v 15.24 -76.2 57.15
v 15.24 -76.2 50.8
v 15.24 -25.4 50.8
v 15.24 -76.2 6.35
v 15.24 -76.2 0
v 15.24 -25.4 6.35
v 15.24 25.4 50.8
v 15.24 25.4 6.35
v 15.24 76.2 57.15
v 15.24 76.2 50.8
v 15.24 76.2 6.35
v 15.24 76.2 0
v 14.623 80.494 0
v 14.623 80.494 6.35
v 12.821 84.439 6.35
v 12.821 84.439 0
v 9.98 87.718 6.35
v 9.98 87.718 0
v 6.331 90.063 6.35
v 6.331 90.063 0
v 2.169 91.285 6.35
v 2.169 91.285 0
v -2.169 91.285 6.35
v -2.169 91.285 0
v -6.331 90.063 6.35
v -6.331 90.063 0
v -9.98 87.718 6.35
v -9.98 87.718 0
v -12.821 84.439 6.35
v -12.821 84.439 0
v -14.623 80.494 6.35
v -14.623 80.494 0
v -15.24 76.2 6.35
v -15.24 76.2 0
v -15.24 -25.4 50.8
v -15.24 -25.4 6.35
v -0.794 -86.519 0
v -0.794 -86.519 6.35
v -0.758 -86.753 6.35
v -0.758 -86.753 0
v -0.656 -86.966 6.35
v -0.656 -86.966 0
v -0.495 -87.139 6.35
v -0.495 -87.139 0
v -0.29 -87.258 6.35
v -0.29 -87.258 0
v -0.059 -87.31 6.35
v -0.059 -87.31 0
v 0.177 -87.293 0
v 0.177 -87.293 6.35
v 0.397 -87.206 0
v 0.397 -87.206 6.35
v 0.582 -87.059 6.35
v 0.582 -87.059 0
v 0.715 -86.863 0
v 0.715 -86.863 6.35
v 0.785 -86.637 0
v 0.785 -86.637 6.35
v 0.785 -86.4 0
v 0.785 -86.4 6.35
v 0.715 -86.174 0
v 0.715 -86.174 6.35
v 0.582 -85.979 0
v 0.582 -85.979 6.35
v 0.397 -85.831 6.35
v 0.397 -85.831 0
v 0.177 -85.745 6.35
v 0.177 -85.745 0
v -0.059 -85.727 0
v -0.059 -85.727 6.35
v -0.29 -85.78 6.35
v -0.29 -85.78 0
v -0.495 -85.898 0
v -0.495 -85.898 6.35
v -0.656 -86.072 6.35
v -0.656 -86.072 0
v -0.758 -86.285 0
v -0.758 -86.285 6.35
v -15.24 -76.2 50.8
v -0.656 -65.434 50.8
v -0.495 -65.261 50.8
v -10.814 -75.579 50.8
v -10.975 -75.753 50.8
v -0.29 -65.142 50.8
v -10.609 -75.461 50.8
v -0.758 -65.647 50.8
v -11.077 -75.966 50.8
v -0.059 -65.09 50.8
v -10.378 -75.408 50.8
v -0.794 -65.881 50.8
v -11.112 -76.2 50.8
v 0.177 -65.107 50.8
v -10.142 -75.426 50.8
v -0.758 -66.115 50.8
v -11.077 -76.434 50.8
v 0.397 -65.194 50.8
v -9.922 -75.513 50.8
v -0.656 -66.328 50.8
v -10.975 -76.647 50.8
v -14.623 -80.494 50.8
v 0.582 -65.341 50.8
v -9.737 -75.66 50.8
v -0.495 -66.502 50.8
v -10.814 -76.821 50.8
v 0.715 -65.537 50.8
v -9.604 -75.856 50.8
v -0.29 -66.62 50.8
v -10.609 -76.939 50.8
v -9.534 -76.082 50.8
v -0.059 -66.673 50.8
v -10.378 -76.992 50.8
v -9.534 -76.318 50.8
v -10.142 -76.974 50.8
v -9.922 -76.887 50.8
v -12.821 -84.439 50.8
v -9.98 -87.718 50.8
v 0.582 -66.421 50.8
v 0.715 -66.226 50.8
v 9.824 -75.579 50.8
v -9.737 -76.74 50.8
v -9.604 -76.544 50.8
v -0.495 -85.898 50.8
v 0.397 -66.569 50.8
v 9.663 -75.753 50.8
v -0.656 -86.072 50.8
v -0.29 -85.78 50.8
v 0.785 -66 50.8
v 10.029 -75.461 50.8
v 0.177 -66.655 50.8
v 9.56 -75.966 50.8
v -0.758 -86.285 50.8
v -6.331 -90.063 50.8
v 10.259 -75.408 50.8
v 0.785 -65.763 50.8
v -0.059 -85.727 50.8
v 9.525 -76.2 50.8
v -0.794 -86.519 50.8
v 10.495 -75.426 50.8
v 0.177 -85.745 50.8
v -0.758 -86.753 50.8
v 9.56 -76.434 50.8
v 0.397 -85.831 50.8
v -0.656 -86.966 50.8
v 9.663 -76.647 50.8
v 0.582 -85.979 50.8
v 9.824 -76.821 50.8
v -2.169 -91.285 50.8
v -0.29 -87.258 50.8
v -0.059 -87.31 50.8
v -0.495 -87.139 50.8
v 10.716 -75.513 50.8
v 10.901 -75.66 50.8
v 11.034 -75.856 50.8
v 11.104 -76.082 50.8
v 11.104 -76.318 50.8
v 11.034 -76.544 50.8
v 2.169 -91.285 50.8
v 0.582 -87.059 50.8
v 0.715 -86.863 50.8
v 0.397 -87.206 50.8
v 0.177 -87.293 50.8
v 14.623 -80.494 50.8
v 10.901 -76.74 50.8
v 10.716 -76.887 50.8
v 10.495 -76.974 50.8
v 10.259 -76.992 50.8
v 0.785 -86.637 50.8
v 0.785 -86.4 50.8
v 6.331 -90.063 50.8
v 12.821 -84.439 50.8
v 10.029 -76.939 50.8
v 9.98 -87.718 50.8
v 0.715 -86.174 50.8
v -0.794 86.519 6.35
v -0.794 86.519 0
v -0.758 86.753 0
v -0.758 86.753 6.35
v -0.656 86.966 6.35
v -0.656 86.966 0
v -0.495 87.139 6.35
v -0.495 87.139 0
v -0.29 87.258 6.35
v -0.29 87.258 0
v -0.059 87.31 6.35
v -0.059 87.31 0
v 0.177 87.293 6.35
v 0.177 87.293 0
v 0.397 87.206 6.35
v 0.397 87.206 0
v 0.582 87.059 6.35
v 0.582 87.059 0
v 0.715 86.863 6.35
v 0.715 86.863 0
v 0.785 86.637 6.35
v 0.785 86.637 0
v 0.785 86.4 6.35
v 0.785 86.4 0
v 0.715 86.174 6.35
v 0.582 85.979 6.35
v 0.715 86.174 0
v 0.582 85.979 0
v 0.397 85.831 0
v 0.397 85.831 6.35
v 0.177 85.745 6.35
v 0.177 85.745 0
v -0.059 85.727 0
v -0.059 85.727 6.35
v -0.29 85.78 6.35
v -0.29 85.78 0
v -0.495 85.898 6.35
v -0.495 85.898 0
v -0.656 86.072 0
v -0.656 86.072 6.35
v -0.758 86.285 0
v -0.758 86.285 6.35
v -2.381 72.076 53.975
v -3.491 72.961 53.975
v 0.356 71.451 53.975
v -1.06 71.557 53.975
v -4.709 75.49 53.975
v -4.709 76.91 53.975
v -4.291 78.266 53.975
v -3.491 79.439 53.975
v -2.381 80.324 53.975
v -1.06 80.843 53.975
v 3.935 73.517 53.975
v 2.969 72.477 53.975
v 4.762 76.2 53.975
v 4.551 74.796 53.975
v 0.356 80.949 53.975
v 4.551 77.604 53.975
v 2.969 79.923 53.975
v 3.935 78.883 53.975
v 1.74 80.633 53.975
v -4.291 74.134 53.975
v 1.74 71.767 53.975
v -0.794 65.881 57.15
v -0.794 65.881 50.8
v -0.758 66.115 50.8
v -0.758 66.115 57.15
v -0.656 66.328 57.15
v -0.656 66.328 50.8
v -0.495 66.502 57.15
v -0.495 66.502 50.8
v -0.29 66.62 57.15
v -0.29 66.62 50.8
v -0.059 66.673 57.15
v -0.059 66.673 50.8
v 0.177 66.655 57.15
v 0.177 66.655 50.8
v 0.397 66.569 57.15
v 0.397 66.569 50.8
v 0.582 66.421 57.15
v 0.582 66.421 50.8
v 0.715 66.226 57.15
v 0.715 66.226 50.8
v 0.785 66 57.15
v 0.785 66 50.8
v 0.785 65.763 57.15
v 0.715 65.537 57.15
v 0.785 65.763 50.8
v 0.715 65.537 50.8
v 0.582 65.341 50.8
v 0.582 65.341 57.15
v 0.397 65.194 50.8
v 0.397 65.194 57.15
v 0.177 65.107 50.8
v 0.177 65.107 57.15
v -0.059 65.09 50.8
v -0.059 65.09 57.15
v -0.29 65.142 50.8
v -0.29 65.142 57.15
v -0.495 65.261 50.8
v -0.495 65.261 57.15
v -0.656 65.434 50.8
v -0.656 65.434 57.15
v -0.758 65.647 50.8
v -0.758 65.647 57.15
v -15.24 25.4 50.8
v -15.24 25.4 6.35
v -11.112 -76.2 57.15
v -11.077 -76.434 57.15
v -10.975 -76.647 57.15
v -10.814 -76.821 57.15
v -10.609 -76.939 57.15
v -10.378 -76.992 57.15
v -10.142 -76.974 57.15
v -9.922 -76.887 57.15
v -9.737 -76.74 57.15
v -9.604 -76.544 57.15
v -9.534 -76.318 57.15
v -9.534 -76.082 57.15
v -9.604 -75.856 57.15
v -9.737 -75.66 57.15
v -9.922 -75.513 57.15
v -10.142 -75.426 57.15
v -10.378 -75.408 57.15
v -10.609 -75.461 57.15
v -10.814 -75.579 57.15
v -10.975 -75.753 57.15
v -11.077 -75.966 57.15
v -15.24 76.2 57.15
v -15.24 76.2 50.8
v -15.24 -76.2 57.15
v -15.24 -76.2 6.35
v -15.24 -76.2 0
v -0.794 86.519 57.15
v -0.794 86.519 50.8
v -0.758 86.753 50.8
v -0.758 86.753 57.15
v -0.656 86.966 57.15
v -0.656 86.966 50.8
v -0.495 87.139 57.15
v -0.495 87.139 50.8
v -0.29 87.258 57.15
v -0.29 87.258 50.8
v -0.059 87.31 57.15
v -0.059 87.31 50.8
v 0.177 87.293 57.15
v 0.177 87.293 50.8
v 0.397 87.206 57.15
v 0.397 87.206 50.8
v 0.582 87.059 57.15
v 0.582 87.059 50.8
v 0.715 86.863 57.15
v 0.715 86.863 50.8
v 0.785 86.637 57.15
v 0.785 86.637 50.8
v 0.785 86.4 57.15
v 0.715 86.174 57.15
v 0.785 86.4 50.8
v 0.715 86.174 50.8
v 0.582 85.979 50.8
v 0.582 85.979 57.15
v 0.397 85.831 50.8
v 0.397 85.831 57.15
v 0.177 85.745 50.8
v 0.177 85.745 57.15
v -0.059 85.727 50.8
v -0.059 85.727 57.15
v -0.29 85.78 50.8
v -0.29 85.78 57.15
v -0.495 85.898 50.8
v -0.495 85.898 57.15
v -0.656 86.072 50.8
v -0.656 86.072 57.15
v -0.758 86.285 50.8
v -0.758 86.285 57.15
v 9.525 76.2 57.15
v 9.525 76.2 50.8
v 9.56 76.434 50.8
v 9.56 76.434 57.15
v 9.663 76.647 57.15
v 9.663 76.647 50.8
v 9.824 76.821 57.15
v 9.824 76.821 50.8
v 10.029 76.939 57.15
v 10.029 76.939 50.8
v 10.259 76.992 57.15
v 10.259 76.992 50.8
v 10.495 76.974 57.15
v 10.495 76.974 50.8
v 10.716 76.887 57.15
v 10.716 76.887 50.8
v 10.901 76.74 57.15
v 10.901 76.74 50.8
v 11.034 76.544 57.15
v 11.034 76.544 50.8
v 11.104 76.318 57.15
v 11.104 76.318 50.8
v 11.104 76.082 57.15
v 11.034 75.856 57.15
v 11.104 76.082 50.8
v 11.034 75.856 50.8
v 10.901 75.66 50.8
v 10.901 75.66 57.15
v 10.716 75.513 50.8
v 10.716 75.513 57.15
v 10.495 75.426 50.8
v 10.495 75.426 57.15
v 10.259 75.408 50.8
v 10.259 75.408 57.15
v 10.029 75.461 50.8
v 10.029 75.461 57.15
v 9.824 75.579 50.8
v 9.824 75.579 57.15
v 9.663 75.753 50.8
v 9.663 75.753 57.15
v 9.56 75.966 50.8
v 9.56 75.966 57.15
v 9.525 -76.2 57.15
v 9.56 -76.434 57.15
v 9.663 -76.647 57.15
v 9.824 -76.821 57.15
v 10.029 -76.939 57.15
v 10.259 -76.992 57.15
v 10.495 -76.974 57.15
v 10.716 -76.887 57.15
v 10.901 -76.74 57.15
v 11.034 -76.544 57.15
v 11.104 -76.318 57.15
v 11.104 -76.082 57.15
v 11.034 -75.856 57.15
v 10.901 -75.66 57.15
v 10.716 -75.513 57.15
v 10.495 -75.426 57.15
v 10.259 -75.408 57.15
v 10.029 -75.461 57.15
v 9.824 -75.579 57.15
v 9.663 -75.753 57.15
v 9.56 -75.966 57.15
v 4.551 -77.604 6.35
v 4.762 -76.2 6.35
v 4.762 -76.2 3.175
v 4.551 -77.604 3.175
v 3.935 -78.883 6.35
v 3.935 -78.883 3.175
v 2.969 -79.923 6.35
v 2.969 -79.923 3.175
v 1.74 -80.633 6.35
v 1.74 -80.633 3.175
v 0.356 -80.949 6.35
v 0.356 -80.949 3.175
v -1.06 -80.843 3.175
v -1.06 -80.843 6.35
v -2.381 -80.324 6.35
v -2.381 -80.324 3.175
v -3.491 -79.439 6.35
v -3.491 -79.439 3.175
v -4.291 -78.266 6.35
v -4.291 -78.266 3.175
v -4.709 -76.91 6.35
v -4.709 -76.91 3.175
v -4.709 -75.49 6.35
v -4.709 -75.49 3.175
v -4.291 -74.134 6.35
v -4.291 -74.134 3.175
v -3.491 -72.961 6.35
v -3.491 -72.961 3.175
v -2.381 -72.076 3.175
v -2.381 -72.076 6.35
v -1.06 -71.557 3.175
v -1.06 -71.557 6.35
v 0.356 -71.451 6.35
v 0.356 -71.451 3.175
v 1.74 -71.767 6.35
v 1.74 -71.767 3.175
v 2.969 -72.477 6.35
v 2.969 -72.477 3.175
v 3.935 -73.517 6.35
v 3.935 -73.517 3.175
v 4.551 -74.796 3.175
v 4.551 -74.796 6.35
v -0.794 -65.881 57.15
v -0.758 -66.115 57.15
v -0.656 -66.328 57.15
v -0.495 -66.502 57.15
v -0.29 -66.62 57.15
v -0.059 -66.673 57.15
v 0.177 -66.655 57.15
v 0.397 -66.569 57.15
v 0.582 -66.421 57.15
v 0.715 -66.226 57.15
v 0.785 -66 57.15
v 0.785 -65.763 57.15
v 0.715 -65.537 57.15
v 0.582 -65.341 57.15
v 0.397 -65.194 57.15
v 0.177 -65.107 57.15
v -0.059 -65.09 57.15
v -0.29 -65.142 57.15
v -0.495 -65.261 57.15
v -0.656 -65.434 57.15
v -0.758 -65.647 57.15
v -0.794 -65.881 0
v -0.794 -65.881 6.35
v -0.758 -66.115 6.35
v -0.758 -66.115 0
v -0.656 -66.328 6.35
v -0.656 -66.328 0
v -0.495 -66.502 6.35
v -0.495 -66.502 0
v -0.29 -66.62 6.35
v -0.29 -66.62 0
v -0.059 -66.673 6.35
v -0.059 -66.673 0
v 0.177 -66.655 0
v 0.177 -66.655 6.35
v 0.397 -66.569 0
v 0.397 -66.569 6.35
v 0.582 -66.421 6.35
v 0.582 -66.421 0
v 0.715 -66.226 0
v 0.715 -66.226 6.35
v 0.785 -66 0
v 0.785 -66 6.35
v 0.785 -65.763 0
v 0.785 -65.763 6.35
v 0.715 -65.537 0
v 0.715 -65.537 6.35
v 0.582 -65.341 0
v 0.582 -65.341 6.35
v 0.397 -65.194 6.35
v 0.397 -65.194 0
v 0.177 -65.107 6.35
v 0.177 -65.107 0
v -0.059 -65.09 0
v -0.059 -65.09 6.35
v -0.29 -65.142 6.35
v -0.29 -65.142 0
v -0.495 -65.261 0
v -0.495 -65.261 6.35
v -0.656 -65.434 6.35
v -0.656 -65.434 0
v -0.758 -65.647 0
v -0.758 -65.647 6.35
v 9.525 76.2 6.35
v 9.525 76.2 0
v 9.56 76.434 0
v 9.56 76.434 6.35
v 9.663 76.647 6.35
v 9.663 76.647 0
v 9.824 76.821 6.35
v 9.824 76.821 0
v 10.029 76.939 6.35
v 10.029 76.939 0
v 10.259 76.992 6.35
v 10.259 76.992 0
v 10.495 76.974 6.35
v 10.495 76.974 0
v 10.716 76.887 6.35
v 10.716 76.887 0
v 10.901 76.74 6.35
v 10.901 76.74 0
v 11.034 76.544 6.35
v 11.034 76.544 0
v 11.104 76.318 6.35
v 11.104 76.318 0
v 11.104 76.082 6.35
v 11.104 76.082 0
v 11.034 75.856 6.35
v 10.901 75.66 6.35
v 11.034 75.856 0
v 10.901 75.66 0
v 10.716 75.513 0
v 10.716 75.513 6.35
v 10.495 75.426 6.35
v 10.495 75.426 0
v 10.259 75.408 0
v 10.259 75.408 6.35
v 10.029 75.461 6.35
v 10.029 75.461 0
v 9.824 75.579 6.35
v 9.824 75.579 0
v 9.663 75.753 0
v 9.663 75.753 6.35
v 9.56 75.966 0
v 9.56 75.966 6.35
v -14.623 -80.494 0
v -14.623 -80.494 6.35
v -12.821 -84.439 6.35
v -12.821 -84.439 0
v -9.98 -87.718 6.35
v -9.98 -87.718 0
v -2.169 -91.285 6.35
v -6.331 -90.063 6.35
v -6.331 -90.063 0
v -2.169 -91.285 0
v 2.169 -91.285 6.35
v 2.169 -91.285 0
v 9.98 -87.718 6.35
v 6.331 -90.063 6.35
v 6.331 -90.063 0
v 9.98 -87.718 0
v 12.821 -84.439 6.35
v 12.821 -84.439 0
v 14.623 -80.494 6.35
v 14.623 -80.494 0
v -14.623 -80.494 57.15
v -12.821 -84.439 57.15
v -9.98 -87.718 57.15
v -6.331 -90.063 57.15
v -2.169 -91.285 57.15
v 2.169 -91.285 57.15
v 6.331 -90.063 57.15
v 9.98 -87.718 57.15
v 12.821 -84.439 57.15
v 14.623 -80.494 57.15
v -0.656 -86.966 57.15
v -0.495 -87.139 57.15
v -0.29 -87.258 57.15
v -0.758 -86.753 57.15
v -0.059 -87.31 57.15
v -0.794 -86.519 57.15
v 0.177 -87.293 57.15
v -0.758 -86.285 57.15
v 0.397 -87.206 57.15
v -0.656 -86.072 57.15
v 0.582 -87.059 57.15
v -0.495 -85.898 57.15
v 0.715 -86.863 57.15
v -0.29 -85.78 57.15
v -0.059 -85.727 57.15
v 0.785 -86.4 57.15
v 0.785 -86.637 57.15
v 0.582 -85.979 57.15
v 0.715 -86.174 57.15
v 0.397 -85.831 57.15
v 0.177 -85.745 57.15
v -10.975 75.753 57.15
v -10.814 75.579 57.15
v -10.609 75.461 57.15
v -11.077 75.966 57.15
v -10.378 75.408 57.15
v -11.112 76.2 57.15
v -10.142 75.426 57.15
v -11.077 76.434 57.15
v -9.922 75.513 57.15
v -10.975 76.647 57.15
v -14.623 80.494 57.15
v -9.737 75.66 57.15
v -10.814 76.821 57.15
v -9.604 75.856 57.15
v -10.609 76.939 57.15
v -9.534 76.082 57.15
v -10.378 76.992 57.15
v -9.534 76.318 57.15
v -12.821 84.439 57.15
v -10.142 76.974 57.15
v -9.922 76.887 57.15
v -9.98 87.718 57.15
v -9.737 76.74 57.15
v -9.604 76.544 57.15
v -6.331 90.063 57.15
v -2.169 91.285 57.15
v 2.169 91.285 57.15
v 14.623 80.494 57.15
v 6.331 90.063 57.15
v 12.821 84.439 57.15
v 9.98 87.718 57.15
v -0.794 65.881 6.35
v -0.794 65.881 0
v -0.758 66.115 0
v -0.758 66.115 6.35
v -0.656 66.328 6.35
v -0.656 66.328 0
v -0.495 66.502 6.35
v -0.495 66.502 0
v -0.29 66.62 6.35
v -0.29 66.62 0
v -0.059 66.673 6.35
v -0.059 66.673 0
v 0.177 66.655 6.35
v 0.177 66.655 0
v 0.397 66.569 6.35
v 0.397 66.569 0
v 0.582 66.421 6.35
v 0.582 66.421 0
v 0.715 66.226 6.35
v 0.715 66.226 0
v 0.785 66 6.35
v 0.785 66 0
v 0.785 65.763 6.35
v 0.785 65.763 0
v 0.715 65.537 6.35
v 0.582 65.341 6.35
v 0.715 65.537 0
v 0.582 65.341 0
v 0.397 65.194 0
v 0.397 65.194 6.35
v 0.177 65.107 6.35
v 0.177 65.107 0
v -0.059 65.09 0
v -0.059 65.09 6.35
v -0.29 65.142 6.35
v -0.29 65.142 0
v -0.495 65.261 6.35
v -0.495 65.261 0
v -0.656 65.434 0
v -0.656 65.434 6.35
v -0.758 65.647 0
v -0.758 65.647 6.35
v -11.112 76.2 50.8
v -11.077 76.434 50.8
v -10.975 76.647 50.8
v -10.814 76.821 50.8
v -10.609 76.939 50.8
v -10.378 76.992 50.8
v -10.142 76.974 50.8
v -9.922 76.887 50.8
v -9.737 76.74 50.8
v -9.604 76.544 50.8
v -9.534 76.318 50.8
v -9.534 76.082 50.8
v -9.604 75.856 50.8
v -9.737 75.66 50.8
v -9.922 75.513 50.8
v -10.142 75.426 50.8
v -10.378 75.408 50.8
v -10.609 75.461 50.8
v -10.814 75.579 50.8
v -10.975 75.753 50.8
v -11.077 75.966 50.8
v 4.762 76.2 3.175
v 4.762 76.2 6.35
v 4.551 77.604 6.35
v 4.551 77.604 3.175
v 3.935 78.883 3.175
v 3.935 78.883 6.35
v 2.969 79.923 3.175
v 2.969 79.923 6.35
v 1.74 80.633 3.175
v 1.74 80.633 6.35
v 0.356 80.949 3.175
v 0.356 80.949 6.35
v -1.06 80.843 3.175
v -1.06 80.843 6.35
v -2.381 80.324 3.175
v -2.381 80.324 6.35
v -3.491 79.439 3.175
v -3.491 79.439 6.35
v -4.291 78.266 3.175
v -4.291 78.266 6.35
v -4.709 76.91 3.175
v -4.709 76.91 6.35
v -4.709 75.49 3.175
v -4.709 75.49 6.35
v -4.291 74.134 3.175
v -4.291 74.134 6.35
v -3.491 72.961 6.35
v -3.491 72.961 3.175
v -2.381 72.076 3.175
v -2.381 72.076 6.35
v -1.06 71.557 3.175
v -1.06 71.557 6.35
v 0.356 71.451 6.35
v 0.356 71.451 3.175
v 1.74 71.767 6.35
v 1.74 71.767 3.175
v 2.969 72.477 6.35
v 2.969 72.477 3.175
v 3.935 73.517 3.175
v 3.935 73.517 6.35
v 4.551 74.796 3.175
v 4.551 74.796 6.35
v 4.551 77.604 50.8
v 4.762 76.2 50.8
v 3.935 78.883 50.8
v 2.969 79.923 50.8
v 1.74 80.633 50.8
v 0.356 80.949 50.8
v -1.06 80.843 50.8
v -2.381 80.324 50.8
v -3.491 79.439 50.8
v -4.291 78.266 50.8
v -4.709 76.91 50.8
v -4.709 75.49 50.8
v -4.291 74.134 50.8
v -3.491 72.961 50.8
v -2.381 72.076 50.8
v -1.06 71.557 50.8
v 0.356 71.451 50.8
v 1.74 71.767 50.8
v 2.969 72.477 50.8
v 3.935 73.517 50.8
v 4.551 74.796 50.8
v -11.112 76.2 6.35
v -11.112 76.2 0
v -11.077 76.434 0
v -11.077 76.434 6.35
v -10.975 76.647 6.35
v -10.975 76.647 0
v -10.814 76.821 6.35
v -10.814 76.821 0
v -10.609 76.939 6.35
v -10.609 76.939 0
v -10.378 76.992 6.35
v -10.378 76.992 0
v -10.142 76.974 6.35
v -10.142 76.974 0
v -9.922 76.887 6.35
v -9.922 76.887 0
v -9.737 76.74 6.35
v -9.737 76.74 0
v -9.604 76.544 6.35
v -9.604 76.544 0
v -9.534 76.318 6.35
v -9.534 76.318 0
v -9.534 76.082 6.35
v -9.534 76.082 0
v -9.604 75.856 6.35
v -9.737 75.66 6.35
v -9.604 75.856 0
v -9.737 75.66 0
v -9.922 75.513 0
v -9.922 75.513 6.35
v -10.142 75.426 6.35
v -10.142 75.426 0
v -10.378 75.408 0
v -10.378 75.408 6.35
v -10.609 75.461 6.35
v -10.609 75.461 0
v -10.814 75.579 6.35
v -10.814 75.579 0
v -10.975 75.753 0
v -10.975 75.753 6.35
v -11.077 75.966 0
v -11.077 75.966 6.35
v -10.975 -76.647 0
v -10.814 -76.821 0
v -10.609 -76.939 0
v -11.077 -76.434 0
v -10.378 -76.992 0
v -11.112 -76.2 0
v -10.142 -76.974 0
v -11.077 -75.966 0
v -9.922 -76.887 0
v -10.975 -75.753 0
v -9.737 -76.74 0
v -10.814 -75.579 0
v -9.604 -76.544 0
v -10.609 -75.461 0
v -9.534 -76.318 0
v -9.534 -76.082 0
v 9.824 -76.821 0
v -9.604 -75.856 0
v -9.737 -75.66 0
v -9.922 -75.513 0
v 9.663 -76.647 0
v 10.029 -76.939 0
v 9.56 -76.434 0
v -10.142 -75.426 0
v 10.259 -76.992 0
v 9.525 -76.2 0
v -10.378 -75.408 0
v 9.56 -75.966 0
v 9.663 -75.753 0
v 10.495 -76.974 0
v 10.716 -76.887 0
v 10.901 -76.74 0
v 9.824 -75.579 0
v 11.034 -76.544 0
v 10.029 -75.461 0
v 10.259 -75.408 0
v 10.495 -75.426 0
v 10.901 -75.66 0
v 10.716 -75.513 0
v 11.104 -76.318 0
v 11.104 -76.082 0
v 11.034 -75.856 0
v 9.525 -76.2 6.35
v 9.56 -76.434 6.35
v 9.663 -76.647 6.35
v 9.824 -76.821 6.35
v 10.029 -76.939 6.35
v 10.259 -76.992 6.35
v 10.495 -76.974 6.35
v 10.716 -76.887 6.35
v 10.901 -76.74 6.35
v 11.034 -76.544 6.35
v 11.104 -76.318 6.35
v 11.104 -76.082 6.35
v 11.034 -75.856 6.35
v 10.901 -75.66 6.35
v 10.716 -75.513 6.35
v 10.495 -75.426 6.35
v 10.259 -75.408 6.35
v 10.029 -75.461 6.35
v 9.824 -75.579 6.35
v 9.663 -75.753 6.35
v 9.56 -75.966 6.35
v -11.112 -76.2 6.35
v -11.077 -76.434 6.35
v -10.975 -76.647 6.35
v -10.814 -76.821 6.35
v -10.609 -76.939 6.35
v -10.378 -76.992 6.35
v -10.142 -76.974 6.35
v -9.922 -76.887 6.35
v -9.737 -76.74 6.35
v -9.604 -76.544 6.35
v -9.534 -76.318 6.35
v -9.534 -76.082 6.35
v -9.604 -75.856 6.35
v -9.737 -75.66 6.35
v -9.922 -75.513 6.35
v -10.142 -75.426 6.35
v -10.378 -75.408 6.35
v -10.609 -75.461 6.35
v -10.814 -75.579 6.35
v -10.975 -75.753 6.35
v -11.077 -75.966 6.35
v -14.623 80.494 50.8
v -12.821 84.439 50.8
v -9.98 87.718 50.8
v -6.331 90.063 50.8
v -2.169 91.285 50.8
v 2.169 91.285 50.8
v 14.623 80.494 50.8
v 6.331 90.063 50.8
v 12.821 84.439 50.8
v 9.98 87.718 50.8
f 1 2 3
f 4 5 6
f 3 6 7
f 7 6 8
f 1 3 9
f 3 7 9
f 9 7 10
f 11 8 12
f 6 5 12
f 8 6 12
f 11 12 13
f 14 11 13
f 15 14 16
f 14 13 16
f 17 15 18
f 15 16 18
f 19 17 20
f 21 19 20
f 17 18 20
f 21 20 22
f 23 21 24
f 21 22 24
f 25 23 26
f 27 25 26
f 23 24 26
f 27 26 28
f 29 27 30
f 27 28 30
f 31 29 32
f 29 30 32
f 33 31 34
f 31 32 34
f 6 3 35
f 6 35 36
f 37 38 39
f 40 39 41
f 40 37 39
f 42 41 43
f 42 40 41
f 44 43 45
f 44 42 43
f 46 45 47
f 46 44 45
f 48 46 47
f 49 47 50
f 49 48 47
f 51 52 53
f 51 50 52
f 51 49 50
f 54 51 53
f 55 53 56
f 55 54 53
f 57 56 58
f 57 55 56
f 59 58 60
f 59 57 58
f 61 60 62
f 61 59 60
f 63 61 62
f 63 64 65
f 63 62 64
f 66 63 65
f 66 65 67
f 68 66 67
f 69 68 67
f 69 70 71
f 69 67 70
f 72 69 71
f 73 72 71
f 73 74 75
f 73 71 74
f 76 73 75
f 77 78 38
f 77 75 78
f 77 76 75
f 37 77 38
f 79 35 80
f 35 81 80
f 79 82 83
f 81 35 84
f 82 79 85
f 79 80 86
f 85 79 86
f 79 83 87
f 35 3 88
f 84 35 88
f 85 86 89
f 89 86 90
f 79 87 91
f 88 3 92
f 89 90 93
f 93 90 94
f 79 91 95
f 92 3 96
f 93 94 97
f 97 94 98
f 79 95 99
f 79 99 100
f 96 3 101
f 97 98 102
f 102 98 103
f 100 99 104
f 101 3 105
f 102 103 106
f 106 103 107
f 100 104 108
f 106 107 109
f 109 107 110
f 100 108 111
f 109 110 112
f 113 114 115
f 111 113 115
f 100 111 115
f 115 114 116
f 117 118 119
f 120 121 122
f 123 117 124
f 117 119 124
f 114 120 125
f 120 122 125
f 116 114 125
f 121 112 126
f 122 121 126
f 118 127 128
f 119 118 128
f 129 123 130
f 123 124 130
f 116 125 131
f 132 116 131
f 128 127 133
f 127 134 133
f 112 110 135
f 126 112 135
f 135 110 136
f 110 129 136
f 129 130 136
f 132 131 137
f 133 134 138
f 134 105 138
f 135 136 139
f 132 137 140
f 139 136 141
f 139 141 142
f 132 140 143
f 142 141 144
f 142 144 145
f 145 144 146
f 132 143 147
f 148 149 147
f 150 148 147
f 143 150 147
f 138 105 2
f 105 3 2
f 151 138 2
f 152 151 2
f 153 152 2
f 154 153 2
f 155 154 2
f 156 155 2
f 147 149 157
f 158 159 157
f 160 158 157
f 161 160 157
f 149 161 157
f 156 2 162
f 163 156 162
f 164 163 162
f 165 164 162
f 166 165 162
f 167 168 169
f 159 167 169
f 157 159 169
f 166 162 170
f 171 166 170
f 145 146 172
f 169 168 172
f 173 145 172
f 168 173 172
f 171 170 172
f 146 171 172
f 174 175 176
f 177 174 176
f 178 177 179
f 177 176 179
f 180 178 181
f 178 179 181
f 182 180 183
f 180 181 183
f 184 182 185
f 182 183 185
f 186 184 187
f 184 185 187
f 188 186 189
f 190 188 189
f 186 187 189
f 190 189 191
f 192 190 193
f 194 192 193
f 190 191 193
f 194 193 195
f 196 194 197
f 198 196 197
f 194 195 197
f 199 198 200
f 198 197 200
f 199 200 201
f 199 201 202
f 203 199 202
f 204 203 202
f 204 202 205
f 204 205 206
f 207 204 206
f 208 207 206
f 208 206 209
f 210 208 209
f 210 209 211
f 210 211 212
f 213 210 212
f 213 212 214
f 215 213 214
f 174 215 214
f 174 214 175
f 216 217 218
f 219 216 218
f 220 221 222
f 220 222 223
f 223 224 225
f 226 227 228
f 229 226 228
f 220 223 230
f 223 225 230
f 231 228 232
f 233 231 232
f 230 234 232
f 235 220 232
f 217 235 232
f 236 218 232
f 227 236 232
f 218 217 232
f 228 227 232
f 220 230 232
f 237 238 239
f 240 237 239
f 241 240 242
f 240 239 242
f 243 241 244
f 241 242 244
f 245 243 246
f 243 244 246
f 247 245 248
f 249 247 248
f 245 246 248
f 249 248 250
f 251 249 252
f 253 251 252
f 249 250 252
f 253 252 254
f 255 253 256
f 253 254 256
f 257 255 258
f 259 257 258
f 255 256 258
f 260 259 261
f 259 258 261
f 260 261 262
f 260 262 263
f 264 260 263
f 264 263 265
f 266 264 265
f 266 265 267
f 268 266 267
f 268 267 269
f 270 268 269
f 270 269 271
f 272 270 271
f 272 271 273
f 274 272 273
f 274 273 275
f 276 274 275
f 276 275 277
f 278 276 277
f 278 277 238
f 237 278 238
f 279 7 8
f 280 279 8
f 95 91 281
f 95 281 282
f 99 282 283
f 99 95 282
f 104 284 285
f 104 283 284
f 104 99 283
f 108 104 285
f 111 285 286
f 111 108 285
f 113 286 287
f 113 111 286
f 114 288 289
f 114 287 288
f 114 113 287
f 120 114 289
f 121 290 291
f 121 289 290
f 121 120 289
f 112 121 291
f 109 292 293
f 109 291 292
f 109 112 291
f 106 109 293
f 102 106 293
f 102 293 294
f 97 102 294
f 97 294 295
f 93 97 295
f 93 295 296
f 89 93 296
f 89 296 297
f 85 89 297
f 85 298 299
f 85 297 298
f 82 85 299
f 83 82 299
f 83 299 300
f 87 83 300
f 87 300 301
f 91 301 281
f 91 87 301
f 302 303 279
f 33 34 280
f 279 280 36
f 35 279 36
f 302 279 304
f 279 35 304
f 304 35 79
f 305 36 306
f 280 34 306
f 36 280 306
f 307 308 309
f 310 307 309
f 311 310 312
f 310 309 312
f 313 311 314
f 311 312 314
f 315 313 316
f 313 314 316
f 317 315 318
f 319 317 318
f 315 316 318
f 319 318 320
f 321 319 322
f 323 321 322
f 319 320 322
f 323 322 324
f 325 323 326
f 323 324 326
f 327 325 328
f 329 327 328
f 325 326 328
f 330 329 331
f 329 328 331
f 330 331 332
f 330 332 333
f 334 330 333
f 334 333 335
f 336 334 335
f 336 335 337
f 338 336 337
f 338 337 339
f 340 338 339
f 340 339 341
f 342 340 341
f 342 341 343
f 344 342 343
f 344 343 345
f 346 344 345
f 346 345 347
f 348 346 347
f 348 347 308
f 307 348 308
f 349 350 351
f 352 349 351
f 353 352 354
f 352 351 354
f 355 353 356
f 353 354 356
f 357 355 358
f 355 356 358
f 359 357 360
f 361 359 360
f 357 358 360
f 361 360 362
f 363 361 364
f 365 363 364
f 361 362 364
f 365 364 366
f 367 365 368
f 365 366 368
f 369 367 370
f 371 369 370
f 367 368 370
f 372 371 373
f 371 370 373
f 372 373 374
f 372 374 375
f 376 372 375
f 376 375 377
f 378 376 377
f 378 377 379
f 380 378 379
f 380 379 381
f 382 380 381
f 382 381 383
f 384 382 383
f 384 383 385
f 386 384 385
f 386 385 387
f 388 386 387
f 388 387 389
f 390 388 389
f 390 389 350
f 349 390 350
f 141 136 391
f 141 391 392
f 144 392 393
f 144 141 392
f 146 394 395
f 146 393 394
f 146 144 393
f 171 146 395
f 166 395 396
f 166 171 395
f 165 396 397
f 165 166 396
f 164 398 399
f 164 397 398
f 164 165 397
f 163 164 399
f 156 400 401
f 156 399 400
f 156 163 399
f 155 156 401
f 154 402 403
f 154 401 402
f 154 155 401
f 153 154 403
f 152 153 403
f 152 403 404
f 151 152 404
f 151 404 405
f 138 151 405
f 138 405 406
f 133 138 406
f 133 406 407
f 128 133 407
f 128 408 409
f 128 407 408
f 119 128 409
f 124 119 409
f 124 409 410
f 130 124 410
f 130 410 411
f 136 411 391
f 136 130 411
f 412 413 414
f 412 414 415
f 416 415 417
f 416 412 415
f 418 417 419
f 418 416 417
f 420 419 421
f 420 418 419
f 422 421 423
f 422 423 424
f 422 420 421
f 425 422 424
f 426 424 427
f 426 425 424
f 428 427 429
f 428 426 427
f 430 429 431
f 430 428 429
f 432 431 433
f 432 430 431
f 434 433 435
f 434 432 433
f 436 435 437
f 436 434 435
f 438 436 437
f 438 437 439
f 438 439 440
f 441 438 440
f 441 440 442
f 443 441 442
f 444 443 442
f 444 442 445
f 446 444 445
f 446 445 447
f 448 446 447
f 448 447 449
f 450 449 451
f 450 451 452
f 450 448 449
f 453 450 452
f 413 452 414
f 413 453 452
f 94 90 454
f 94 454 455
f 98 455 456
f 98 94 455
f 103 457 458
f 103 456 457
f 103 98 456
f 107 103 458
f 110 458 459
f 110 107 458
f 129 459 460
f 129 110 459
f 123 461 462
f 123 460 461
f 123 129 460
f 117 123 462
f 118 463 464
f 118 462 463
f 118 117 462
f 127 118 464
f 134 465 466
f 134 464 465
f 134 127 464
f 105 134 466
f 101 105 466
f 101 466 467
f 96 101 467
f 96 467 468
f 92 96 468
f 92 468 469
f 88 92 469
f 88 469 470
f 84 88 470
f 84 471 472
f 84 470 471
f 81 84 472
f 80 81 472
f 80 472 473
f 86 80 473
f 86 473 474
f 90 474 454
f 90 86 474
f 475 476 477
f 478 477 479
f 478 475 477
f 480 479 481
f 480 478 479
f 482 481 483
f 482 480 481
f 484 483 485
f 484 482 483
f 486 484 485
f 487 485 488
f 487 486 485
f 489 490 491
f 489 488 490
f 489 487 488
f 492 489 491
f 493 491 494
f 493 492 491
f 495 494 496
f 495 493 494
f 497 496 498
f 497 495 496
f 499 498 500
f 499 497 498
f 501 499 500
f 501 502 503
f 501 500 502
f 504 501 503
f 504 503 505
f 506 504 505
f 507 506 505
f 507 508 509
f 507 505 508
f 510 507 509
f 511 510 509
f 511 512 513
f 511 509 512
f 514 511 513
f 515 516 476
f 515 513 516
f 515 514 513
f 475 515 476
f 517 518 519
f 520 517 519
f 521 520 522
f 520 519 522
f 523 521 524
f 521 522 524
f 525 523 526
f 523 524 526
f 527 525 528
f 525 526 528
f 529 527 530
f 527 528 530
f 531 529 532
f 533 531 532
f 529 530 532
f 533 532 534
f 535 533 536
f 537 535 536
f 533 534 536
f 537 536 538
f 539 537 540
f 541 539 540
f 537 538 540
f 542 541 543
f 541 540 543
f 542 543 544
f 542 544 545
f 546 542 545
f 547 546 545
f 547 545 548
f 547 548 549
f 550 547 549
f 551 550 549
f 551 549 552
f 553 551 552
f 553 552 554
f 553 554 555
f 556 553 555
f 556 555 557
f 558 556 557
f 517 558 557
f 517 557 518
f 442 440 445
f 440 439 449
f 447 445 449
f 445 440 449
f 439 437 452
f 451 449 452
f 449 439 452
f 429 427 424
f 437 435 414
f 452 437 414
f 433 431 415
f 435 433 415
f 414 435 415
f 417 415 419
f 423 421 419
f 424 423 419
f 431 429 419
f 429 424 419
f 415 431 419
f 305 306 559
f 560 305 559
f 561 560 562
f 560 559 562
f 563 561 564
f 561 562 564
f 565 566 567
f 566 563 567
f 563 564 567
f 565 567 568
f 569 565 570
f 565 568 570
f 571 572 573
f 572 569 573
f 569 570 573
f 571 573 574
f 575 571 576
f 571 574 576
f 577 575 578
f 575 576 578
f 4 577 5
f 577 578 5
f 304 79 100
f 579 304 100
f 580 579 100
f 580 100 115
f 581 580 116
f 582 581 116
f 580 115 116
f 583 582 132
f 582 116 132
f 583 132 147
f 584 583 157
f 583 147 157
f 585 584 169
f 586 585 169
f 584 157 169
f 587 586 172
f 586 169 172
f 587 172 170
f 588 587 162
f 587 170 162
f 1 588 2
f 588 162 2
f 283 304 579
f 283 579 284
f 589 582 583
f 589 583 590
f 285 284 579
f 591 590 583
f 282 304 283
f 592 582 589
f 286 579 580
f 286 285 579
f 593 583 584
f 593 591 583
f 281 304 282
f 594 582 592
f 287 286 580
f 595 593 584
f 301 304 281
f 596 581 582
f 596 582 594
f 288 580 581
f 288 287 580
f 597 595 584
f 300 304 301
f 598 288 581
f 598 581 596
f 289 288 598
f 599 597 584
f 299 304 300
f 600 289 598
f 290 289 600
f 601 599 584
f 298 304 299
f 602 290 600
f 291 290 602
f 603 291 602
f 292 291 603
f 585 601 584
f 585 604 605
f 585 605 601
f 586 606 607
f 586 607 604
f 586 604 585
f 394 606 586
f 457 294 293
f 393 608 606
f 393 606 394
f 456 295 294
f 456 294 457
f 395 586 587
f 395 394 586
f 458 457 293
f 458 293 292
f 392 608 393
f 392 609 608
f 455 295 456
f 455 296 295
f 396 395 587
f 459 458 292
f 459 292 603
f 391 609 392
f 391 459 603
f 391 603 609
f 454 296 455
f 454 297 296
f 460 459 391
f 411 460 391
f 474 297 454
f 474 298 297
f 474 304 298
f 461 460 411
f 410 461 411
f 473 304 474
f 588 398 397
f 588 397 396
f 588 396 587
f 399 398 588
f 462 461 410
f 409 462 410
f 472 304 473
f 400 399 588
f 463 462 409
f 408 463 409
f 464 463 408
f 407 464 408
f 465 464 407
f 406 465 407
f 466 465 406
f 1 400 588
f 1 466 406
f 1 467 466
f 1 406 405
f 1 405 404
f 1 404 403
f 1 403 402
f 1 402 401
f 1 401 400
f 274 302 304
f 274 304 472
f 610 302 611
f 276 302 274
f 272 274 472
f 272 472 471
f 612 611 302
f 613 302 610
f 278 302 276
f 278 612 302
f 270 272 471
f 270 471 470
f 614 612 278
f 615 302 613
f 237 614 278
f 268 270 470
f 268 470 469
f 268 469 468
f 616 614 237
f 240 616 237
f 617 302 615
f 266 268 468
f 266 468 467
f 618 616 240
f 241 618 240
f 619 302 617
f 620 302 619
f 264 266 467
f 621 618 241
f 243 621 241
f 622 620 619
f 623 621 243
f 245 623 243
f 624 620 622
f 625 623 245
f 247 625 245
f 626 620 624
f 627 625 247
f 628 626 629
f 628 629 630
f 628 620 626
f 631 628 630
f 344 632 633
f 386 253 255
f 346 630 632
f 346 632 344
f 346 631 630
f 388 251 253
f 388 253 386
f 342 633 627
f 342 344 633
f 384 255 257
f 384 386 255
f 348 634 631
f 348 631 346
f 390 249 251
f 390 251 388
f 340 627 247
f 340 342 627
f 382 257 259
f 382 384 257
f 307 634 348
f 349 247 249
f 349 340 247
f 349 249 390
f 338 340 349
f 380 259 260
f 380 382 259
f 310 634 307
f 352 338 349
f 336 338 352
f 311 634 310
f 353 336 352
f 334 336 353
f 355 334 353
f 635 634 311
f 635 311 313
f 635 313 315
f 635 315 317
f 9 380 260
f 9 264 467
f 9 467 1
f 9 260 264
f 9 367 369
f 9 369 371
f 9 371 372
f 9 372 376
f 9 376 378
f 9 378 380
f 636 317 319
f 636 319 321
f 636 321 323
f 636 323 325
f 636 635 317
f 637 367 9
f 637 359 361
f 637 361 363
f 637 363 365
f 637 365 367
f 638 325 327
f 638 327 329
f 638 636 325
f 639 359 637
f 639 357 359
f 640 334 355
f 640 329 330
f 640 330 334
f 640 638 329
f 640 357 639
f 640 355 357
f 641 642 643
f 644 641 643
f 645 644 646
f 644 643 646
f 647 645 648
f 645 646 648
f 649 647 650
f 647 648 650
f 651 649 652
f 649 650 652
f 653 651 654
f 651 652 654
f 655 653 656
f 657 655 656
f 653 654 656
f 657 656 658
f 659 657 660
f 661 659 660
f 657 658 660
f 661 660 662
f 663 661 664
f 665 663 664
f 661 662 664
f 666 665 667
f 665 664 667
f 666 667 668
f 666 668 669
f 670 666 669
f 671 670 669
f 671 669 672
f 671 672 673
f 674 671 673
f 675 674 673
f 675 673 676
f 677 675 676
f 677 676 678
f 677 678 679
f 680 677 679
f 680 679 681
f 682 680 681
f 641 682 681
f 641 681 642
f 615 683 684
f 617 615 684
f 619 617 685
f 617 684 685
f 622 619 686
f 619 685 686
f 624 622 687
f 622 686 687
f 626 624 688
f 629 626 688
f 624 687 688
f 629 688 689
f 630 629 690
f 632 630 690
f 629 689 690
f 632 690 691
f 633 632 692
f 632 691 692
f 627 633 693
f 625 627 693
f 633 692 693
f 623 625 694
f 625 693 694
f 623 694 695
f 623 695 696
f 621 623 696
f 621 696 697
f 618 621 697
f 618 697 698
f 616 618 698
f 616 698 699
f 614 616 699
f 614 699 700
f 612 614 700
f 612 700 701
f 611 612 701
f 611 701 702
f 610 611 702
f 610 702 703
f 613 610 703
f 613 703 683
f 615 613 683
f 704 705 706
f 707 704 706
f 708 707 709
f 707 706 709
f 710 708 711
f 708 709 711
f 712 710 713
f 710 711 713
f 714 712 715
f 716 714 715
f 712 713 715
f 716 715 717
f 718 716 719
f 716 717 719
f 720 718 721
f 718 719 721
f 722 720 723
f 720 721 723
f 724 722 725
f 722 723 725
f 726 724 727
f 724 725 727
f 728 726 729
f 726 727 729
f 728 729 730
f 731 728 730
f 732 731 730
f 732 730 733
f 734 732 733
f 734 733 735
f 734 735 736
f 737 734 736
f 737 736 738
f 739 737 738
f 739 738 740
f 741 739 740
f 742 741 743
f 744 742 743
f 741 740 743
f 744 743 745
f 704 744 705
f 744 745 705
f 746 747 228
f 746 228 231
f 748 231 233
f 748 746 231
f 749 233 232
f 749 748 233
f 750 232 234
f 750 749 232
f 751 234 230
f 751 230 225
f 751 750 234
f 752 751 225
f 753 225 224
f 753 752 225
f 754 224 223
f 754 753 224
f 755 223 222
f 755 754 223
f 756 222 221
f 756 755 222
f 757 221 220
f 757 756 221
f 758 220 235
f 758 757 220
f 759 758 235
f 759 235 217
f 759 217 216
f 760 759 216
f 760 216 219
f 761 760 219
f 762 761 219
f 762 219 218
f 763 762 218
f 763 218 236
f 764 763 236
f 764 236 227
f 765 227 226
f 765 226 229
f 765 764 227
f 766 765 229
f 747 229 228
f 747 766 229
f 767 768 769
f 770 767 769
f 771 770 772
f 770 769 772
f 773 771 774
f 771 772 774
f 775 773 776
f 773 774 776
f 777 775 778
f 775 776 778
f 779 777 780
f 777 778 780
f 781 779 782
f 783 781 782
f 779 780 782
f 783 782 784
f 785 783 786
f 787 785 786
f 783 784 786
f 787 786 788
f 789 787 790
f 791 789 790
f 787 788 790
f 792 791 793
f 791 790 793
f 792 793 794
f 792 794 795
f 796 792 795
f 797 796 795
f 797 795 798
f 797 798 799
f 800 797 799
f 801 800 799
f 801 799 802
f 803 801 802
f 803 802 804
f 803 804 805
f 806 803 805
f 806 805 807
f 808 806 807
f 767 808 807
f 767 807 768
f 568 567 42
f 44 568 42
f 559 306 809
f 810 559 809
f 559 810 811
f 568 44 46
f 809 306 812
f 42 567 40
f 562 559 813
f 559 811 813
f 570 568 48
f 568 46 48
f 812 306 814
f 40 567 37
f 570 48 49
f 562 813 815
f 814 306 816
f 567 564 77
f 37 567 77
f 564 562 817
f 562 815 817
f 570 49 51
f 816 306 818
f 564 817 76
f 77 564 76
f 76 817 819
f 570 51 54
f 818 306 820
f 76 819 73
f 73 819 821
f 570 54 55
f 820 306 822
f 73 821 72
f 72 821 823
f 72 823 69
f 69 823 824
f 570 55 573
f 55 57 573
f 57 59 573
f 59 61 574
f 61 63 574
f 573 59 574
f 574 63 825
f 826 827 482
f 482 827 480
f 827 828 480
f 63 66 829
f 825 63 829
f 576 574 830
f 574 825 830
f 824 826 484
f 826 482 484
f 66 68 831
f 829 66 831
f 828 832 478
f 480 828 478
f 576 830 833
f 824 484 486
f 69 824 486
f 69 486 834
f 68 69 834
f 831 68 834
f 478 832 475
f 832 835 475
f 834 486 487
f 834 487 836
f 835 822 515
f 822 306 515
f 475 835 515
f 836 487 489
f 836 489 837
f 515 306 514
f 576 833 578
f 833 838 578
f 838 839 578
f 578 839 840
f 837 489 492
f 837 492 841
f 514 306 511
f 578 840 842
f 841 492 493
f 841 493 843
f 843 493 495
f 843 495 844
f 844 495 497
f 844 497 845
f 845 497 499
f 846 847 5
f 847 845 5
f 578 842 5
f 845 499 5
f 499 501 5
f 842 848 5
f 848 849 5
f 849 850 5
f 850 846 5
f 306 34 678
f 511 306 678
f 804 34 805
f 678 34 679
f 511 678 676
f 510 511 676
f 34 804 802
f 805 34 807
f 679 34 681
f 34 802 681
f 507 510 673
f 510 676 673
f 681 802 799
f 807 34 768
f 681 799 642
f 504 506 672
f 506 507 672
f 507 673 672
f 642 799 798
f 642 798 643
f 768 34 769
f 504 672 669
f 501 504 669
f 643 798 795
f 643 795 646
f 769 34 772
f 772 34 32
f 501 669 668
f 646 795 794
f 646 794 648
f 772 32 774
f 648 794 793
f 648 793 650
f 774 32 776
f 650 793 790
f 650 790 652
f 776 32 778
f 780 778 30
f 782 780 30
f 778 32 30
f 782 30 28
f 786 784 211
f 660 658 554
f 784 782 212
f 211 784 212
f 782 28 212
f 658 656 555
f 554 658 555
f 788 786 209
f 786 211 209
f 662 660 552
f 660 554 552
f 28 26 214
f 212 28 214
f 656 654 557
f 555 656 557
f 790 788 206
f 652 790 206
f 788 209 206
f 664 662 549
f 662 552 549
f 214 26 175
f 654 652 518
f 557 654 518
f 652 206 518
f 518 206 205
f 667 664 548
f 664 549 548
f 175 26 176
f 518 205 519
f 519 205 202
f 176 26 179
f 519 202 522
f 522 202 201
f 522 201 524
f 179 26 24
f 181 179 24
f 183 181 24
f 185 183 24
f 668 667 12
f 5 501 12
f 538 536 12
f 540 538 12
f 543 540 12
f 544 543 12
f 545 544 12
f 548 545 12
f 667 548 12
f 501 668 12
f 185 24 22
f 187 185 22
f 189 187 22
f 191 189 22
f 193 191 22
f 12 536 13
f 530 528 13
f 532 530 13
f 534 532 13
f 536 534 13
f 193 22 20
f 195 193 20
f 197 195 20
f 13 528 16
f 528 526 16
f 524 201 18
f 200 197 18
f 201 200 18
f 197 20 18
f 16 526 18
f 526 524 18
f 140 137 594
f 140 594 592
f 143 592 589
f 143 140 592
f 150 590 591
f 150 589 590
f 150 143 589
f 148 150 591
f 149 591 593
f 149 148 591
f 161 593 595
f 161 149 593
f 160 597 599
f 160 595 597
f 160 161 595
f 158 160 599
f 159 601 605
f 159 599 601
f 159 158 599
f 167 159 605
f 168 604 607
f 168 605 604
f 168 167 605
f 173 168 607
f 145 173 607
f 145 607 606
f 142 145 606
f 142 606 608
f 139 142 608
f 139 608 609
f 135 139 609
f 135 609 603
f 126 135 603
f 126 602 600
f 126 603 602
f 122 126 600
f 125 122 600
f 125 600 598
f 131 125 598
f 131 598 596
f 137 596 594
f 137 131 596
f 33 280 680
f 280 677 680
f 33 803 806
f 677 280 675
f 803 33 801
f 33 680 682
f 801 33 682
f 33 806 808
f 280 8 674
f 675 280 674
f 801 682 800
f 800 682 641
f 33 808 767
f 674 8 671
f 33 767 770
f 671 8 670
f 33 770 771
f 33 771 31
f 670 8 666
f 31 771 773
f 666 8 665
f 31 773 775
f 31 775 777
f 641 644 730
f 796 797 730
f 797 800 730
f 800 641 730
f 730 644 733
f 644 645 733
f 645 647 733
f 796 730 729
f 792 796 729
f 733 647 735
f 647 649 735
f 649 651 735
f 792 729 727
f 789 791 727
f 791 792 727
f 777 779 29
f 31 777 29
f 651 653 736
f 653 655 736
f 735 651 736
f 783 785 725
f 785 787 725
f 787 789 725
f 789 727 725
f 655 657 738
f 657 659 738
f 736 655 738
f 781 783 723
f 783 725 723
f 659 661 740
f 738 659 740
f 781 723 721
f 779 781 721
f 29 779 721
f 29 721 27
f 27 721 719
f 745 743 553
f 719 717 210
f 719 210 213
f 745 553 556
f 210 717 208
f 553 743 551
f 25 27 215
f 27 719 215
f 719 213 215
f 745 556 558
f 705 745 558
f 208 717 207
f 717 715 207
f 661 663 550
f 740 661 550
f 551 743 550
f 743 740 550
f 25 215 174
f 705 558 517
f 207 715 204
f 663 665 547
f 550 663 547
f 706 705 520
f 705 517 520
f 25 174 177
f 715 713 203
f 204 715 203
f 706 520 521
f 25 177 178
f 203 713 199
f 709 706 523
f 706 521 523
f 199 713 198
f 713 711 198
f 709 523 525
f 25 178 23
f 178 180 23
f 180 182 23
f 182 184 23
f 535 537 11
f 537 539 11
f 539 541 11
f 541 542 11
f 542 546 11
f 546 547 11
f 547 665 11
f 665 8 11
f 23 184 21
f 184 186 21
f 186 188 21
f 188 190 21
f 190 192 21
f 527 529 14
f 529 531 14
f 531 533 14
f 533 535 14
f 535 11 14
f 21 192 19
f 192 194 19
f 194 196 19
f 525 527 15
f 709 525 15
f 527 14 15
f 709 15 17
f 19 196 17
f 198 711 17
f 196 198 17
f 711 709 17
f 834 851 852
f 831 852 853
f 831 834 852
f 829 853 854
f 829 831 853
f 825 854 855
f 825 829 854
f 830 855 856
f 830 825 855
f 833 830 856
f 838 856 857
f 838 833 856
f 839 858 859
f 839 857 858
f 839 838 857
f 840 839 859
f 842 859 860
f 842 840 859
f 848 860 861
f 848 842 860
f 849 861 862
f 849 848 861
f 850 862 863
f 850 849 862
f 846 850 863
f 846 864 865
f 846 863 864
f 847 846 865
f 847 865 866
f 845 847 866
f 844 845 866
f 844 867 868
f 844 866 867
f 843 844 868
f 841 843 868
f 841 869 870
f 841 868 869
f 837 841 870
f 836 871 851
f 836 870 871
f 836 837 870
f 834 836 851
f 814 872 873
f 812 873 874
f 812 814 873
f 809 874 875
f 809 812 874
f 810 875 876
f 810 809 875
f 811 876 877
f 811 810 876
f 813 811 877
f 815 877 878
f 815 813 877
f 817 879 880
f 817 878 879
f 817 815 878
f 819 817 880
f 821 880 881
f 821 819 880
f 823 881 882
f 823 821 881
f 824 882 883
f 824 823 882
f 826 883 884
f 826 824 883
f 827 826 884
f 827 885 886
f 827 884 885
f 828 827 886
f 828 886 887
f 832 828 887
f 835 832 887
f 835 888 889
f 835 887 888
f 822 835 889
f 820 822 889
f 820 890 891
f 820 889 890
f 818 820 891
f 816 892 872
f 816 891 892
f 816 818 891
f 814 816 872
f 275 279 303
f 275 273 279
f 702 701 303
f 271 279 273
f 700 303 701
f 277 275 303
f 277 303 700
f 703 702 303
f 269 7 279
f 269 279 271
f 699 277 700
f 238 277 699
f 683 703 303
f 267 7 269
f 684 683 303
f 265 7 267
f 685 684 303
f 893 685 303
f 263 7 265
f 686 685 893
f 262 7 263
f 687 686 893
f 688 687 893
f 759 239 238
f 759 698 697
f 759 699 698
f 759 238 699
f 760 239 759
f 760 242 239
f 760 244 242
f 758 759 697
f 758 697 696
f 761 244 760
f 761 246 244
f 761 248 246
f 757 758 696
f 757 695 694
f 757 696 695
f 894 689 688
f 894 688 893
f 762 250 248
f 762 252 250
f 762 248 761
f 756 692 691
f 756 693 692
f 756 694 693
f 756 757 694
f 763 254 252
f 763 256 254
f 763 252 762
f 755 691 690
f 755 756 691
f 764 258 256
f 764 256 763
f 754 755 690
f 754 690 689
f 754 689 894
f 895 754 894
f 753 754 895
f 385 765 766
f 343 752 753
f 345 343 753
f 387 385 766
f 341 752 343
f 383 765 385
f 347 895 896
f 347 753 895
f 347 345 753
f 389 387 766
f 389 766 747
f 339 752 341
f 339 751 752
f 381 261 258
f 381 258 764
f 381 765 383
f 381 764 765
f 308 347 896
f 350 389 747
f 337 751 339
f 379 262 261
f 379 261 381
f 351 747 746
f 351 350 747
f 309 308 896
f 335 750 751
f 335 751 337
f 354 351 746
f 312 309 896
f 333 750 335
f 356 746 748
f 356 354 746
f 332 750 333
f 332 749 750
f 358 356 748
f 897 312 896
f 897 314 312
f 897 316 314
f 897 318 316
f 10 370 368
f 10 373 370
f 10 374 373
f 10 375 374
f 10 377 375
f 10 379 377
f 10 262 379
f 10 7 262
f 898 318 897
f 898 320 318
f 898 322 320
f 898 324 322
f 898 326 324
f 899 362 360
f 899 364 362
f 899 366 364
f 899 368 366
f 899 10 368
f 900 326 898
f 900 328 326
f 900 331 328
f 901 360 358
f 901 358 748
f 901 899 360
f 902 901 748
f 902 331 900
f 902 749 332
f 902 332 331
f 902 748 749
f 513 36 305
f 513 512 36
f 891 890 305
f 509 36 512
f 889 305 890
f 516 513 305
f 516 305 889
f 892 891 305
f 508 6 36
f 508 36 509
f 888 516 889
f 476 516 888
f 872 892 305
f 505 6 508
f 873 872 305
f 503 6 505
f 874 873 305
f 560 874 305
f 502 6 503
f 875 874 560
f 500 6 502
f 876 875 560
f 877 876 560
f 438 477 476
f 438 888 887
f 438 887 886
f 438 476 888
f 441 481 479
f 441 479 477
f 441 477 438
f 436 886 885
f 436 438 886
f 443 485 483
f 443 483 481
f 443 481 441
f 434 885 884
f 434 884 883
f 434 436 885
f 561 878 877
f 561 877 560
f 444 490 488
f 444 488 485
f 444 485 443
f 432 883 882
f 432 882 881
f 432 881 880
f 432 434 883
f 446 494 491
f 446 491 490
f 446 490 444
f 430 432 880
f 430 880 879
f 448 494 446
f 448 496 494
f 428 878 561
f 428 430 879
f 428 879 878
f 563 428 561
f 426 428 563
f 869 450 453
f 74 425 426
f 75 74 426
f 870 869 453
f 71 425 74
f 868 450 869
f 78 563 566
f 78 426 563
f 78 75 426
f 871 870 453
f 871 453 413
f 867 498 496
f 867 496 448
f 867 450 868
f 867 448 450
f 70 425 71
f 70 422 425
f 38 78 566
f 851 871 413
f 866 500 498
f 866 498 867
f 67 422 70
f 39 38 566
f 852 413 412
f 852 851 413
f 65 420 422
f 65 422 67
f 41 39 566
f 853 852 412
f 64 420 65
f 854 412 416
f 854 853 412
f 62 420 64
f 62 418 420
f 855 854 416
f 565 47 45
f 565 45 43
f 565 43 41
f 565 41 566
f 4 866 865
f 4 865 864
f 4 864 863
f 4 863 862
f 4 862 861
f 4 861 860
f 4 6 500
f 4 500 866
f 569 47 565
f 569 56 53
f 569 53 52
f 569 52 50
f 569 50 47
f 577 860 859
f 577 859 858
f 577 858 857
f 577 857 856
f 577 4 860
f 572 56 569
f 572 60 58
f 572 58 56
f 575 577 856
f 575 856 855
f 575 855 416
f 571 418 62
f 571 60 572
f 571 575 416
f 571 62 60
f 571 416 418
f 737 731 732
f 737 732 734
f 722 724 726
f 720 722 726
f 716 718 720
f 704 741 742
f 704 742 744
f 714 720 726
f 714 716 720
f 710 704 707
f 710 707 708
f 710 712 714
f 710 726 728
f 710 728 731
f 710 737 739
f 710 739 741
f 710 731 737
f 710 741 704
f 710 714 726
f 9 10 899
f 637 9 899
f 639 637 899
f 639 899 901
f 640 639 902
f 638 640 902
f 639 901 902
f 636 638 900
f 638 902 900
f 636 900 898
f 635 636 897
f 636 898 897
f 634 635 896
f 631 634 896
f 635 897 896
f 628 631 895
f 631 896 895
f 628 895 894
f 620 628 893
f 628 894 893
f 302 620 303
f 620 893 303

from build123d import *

# Parameters (mm, degrees)
BOSS_EXTRUDE1_DEPTH = 57.15
SKETCH2_W           = 44.45
SKETCH2_H           = 66.04
CUT_EXTRUDE1_DEPTH  = 57.15
SKETCH6_R           = 4.7625
CUT_EXTRUDE3_DEPTH  = 3.175
SKETCH8_R           = 0.79375
CUT_EXTRUDE4_DEPTH  = 58.15


with BuildPart() as part:
    # Sketch1 → Boss-Extrude1 (new body)
    with BuildSketch(Plane.XY):
        with BuildLine():
            Line((-15.24, 76.2), (-15.24, -76.2))
            ThreePointArc((-15.24, -76.2), (0, -91.44), (15.24, -76.2))
            Line((15.24, -76.2), (15.24, 76.2))
            ThreePointArc((15.24, 76.2), (0, 91.44), (-15.24, 76.2))
        make_face()
    extrude(amount=BOSS_EXTRUDE1_DEPTH)

    # Sketch2 → Cut-Extrude1 (cut)
    with BuildSketch(Plane(origin=(15.24, 0, 0), x_dir=(0, 0, -1), z_dir=(1, 0, 0))):
        with Locations((-28.575, 58.42)):
            Rectangle(SKETCH2_W, SKETCH2_H)
    cut_extrude1 = extrude(amount=-CUT_EXTRUDE1_DEPTH, mode=Mode.SUBTRACT)

    # Sketch6 → Cut-Extrude3 (cut)
    with BuildSketch(Plane.XY.offset(6.35)):
        with Locations((0, 76.2)):
            Circle(SKETCH6_R)
    cut_extrude3 = extrude(amount=-CUT_EXTRUDE3_DEPTH, mode=Mode.SUBTRACT)

    # Mirror3: Cut-Extrude3 across plane
    add(cut_extrude3.mirror(Plane.XY.offset(28.575)), mode=Mode.SUBTRACT)

    # Sketch8 → Cut-Extrude4 (cut, through all)
    with BuildSketch(Plane(origin=(0, 0, 0), x_dir=(-1, 0, 0), z_dir=(0, 0, -1))):
        with Locations((0, 65.88125)):
            Circle(SKETCH8_R)
        with Locations((-10.31875, 76.2)):
            Circle(SKETCH8_R)
        with Locations((0, 86.51875)):
            Circle(SKETCH8_R)
        with Locations((10.31875, 76.2)):
            Circle(SKETCH8_R)
    cut_extrude4 = extrude(amount=-CUT_EXTRUDE4_DEPTH, mode=Mode.SUBTRACT)

    # Mirror7: Cut-Extrude1, Cut-Extrude3, Cut-Extrude4 across plane
    add(cut_extrude1.mirror(Plane.ZX), mode=Mode.SUBTRACT)
    add(cut_extrude3.mirror(Plane.ZX), mode=Mode.SUBTRACT)
    add(cut_extrude4.mirror(Plane.ZX), mode=Mode.SUBTRACT)


solid = part.part
